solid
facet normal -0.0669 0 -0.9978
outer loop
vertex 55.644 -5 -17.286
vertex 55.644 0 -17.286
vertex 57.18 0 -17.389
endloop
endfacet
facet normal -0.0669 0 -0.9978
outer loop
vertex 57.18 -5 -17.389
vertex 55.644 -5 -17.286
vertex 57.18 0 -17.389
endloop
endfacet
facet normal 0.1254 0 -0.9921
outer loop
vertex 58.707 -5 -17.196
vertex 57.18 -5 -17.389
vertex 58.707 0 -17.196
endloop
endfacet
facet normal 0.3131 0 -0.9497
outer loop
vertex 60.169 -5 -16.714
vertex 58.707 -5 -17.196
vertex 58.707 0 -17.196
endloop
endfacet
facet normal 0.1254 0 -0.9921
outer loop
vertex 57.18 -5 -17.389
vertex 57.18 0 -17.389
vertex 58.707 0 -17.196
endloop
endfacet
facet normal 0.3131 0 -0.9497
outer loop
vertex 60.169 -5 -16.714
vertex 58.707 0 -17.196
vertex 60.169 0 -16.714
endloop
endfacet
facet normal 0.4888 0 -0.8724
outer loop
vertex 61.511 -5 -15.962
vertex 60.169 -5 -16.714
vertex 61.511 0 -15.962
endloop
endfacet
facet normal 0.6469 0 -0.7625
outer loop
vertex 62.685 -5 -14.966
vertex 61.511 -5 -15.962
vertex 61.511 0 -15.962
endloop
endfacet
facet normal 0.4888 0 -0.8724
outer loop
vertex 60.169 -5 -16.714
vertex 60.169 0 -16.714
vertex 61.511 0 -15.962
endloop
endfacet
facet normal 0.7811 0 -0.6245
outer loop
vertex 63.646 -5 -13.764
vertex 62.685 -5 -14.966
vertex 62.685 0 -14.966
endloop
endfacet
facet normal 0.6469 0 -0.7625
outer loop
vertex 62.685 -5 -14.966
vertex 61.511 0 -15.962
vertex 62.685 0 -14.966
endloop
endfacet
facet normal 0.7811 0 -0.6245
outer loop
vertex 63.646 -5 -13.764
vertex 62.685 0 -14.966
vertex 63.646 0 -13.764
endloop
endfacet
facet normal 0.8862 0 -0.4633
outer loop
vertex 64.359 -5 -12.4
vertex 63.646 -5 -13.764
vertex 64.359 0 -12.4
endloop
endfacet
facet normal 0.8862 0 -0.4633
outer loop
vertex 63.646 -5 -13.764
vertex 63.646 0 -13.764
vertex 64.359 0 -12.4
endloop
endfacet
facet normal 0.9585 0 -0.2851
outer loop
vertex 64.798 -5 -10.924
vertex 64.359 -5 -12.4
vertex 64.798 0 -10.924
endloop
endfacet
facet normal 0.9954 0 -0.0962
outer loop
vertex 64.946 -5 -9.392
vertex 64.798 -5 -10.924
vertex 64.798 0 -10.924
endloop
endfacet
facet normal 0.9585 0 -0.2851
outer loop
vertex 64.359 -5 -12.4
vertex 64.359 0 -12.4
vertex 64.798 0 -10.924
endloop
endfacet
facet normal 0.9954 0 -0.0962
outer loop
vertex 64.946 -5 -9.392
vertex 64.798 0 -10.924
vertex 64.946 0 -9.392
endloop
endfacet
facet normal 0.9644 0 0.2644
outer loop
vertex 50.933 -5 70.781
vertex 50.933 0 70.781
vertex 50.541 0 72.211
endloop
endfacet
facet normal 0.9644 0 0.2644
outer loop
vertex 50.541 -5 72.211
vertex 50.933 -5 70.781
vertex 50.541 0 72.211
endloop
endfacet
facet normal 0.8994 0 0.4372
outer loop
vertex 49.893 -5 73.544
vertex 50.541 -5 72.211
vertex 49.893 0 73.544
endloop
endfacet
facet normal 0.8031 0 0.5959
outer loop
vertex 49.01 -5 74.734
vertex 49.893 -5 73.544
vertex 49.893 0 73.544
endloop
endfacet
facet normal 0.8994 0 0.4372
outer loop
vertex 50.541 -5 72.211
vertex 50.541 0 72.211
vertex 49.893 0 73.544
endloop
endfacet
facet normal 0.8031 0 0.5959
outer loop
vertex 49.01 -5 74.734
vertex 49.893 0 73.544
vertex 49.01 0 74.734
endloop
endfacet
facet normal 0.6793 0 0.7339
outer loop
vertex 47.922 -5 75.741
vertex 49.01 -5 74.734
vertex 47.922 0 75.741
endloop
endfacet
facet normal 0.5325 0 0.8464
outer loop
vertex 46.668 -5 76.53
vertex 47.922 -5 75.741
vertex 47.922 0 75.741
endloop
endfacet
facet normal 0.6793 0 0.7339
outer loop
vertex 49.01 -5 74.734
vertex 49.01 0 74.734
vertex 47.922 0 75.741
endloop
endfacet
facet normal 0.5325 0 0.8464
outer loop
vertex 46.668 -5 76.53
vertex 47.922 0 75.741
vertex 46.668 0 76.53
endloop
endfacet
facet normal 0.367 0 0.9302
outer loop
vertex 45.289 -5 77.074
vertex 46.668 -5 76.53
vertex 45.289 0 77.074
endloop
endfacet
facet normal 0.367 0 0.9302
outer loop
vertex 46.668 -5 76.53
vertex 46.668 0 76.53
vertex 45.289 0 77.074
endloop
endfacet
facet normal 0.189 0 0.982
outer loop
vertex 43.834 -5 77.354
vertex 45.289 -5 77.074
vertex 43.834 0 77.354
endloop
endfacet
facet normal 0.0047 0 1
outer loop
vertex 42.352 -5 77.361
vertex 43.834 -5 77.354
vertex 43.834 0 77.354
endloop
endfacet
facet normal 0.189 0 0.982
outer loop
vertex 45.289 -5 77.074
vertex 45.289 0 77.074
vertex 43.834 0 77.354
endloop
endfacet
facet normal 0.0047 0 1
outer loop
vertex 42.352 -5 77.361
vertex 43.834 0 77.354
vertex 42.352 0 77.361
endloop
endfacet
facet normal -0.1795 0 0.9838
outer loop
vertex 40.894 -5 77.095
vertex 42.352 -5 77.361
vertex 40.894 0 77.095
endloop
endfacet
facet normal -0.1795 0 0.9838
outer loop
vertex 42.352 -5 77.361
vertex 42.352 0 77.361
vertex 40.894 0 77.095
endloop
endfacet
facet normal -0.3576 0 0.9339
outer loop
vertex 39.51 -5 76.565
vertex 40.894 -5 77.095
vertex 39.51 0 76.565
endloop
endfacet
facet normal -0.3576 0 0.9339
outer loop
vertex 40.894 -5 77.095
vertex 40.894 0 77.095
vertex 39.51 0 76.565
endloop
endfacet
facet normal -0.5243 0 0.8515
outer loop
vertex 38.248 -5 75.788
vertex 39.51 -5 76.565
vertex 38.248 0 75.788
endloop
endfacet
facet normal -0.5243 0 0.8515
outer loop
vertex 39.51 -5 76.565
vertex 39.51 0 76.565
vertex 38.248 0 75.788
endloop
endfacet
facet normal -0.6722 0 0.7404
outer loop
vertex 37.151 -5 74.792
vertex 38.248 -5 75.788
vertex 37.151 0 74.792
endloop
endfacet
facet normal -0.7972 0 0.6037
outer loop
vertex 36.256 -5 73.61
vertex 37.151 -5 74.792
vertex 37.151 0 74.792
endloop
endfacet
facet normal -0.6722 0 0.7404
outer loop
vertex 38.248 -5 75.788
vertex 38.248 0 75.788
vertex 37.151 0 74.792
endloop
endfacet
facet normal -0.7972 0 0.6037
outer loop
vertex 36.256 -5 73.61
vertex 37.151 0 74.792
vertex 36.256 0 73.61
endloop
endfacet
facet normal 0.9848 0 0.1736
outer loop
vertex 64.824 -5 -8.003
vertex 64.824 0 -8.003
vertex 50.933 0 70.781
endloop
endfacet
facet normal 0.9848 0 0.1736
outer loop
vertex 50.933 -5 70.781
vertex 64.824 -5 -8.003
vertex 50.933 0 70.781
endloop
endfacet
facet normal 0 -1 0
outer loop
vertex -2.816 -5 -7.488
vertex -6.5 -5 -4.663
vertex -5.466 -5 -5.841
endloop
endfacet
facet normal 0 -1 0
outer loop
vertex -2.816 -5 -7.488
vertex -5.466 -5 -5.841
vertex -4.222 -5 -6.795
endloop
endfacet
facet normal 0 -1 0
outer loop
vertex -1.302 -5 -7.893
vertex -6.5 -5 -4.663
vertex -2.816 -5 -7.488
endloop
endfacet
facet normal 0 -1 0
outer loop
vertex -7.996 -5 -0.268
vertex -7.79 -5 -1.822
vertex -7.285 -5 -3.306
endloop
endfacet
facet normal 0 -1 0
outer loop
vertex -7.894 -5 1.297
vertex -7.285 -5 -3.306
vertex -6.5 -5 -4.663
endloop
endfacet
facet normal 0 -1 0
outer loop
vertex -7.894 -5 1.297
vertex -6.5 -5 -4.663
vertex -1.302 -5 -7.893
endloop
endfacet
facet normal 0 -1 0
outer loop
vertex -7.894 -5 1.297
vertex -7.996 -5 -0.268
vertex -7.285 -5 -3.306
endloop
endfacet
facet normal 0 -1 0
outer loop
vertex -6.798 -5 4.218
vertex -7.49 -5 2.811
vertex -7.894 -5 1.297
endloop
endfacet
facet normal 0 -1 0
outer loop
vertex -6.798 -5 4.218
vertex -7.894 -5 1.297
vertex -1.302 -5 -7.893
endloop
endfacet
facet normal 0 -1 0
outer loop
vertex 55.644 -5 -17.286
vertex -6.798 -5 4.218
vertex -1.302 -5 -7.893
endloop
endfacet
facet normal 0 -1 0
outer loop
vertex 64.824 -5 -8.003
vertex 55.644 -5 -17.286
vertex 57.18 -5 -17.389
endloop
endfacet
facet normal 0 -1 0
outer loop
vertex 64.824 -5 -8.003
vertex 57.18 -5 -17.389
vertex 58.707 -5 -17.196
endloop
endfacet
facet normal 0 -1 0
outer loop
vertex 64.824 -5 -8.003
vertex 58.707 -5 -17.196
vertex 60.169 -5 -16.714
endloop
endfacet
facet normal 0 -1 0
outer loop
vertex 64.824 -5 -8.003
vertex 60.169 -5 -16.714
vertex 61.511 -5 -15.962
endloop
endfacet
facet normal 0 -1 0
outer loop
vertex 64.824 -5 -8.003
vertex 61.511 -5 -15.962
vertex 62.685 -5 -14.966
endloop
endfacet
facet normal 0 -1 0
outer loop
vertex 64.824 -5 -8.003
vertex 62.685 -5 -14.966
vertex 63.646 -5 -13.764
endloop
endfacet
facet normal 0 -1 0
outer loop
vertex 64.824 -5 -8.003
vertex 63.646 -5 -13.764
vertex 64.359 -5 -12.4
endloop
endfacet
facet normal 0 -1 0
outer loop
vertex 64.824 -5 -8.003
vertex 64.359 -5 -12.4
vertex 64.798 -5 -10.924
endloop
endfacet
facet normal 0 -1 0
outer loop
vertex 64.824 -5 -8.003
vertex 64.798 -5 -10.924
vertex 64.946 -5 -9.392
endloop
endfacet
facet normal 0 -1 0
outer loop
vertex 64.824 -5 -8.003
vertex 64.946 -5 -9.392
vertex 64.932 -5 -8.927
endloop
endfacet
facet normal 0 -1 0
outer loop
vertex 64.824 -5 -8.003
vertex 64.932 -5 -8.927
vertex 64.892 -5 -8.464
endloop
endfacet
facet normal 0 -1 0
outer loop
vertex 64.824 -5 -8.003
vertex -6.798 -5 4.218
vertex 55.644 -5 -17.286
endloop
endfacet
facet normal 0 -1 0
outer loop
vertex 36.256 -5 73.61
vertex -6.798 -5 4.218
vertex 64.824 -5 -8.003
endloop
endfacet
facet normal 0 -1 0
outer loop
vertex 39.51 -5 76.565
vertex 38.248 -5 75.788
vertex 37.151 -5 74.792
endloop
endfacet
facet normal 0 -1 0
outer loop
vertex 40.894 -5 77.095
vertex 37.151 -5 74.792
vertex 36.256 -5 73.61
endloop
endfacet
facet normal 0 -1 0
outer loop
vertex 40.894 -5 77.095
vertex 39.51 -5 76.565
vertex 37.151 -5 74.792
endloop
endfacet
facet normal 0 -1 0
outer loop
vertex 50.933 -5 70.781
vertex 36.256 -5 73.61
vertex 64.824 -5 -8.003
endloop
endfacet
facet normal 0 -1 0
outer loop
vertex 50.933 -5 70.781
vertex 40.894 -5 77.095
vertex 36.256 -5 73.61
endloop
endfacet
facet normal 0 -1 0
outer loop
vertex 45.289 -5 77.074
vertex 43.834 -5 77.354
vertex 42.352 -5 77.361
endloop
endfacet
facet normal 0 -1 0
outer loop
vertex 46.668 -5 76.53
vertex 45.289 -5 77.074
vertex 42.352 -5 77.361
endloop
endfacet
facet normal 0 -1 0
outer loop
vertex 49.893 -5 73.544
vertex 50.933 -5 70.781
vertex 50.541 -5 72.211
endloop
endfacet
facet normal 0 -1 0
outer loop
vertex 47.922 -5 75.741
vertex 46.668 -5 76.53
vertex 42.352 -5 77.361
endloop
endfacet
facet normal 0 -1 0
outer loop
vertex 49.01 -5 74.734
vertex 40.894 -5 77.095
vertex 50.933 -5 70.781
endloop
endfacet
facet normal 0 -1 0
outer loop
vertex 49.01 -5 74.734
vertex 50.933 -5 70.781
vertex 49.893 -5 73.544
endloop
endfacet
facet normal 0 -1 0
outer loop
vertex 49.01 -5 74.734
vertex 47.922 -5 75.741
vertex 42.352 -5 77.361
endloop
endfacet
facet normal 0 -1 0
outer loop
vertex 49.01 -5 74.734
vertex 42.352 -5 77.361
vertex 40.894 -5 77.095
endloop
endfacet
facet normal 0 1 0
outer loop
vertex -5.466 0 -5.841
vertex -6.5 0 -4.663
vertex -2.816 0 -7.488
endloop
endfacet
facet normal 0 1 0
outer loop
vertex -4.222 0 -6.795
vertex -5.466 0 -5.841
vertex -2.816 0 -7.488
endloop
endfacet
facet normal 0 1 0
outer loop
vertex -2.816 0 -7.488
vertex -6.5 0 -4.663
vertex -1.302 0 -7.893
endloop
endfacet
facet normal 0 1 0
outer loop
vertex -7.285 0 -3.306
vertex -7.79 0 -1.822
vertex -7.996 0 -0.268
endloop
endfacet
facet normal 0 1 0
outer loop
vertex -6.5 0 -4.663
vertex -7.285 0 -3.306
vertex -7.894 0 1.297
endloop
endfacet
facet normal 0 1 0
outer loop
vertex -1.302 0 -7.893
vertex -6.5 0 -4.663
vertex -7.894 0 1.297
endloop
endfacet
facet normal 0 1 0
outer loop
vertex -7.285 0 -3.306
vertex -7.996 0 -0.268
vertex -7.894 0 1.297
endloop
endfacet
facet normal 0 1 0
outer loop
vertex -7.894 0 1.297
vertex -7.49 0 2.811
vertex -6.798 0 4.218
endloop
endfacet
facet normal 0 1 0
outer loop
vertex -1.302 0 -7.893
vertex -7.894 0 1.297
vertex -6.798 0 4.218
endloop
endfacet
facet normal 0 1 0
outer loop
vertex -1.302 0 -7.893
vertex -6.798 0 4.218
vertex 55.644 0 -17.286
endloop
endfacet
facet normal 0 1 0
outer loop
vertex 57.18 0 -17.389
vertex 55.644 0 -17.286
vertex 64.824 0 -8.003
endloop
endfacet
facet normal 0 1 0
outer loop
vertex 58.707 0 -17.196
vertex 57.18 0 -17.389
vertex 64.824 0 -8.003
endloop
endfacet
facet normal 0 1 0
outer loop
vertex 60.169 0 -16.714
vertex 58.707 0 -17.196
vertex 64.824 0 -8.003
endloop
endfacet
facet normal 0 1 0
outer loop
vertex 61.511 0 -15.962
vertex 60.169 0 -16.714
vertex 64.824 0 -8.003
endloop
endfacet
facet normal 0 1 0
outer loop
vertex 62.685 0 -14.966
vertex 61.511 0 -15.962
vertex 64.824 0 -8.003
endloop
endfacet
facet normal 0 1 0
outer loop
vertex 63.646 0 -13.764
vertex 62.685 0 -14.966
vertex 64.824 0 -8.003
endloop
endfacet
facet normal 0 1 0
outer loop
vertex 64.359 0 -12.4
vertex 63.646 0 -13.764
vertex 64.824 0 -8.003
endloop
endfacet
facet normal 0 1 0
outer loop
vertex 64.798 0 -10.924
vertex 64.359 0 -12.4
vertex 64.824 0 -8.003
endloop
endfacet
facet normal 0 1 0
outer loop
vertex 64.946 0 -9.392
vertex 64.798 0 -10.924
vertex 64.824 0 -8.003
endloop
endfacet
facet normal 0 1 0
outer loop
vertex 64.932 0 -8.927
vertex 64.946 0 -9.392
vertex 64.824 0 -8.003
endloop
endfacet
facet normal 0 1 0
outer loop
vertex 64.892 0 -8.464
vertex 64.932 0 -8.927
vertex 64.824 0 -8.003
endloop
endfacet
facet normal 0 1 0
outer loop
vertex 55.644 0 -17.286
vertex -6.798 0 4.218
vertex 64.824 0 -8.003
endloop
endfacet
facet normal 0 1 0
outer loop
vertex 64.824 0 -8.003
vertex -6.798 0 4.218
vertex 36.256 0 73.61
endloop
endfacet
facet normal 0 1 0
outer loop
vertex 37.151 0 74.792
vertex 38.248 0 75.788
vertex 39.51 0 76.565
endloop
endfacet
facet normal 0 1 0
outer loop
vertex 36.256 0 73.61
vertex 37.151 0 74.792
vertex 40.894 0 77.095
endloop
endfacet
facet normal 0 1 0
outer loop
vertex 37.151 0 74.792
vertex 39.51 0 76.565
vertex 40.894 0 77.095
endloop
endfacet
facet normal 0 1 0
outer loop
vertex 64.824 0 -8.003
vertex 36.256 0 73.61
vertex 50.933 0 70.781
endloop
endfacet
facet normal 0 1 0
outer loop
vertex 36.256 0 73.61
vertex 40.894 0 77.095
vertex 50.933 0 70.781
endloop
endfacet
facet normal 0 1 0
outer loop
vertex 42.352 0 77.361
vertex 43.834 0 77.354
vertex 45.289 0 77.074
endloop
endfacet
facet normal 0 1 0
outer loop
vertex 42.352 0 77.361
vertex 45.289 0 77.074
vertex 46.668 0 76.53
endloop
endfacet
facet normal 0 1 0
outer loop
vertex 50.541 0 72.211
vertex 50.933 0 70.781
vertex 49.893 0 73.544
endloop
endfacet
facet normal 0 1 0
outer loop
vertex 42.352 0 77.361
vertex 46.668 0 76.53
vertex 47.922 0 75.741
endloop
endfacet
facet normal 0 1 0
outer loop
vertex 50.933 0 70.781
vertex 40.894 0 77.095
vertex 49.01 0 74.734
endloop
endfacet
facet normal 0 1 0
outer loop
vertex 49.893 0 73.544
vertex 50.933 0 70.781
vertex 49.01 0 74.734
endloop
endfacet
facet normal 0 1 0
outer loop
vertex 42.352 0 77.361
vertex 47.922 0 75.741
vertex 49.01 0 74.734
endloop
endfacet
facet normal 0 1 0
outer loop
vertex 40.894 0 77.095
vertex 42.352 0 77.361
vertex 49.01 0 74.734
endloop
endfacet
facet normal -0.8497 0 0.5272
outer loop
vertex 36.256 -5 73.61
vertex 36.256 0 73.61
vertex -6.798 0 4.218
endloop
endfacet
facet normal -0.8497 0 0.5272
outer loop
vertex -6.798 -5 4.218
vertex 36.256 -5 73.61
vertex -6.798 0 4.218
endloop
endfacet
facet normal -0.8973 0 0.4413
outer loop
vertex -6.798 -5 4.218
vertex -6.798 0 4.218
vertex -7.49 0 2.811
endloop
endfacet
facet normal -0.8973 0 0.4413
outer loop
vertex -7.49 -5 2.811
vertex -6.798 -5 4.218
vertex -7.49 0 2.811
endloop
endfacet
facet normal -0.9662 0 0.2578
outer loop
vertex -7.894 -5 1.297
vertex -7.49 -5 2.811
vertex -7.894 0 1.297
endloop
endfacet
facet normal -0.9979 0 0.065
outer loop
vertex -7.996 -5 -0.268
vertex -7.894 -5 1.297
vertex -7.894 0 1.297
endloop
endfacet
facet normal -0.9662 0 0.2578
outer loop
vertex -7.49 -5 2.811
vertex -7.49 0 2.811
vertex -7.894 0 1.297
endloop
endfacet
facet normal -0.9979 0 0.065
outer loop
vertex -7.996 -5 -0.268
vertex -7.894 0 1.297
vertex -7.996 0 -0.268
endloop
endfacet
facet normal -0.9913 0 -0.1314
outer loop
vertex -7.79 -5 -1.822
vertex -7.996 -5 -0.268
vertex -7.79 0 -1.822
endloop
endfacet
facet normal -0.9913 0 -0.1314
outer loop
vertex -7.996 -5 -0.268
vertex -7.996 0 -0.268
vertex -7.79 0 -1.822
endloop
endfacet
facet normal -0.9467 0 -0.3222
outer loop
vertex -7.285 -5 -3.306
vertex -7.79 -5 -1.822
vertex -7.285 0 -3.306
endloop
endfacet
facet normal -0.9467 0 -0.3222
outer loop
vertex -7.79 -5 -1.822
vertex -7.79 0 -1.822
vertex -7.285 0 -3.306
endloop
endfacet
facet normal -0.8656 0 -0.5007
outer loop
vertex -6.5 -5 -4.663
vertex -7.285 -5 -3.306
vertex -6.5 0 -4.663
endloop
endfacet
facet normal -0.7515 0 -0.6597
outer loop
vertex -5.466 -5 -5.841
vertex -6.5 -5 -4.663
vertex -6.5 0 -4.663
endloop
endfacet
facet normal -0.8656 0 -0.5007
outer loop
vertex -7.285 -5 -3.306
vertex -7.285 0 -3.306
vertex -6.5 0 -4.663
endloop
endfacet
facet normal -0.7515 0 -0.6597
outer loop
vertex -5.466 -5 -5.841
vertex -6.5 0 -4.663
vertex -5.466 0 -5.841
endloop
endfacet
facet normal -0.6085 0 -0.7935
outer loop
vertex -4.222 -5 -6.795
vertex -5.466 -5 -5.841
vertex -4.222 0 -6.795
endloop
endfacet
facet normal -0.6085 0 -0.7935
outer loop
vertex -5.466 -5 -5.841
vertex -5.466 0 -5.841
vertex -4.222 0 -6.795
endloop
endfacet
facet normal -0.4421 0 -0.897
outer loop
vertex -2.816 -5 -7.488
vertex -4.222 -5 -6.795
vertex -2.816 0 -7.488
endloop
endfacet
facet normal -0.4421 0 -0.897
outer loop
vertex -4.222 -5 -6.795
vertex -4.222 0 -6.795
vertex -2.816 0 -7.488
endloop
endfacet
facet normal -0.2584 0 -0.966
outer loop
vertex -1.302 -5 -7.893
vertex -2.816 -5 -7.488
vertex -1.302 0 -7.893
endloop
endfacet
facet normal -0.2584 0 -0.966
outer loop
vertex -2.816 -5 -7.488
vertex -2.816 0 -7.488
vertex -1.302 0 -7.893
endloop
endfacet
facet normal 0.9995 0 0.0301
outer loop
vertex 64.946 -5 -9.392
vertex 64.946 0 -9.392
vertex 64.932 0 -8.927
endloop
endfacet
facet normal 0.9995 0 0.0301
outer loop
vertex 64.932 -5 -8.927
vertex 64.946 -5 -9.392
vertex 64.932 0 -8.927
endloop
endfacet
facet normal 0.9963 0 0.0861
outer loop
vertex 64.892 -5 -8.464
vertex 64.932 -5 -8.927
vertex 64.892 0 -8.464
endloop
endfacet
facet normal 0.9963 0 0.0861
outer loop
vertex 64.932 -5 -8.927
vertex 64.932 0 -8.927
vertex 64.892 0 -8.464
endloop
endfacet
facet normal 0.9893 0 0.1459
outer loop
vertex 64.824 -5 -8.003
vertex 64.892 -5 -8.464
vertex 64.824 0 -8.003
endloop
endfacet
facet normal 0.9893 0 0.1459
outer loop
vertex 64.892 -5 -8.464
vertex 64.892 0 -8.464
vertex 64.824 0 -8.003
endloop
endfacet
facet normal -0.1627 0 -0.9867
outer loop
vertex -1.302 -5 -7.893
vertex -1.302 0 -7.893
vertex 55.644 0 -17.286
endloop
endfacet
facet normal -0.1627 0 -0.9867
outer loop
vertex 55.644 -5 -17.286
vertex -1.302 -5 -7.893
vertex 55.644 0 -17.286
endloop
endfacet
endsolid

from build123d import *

# Parameters (mm, degrees)
F1_DEPTH = 5


with BuildPart() as f1:
    # F0 (on Front) → F1 (new body)
    with BuildSketch(Plane.XZ):
        with BuildLine():
            ThreePointArc((-6.797868, 4.217699), (2.192835, 7.693599), (8, 0))
            ThreePointArc((8, 0), (5.176145, -6.099797), (-1.301882, -7.893358))
            Line((-1.301882, -7.893358), (55.644045, -17.285668))
            ThreePointArc((55.644045, -17.285668), (51.257847, -3.766855), (64.824389, -8.003125))
            Line((64.824389, -8.003125), (50.932535, 70.781496))
            ThreePointArc((50.932535, 70.781496), (51.02363, 70.089556), (51.054073, 69.39231))
            ThreePointArc((51.054073, 69.39231), (40.861237, 61.698711), (36.256205, 73.61001))
            Line((36.256205, 73.61001), (-6.797868, 4.217699))
        make_face()
        with BuildLine():
            ThreePointArc((-1.301882, -7.893358), (5.176145, -6.099797), (8, 0))
            ThreePointArc((8, 0), (2.192835, 7.693599), (-6.797868, 4.217699))
            ThreePointArc((-6.797868, 4.217699), (-7.284979, -3.305916), (-1.301882, -7.893358))
        make_face()
        with BuildLine():
            ThreePointArc((64.824389, -8.003125), (51.257847, -3.766855), (55.644045, -17.285668))
            ThreePointArc((55.644045, -17.285668), (62.122072, -15.492107), (64.945927, -9.39231))
            ThreePointArc((64.945927, -9.39231), (64.915485, -8.695064), (64.824389, -8.003125))
        make_face()
        with BuildLine():
            ThreePointArc((50.932535, 70.781496), (44.568023, 77.247751), (36.256205, 73.61001))
            ThreePointArc((36.256205, 73.61001), (40.861237, 61.698711), (51.054073, 69.39231))
            ThreePointArc((51.054073, 69.39231), (51.02363, 70.089556), (50.932535, 70.781496))
        make_face()
    extrude(amount=F1_DEPTH)


solid = f1.part
